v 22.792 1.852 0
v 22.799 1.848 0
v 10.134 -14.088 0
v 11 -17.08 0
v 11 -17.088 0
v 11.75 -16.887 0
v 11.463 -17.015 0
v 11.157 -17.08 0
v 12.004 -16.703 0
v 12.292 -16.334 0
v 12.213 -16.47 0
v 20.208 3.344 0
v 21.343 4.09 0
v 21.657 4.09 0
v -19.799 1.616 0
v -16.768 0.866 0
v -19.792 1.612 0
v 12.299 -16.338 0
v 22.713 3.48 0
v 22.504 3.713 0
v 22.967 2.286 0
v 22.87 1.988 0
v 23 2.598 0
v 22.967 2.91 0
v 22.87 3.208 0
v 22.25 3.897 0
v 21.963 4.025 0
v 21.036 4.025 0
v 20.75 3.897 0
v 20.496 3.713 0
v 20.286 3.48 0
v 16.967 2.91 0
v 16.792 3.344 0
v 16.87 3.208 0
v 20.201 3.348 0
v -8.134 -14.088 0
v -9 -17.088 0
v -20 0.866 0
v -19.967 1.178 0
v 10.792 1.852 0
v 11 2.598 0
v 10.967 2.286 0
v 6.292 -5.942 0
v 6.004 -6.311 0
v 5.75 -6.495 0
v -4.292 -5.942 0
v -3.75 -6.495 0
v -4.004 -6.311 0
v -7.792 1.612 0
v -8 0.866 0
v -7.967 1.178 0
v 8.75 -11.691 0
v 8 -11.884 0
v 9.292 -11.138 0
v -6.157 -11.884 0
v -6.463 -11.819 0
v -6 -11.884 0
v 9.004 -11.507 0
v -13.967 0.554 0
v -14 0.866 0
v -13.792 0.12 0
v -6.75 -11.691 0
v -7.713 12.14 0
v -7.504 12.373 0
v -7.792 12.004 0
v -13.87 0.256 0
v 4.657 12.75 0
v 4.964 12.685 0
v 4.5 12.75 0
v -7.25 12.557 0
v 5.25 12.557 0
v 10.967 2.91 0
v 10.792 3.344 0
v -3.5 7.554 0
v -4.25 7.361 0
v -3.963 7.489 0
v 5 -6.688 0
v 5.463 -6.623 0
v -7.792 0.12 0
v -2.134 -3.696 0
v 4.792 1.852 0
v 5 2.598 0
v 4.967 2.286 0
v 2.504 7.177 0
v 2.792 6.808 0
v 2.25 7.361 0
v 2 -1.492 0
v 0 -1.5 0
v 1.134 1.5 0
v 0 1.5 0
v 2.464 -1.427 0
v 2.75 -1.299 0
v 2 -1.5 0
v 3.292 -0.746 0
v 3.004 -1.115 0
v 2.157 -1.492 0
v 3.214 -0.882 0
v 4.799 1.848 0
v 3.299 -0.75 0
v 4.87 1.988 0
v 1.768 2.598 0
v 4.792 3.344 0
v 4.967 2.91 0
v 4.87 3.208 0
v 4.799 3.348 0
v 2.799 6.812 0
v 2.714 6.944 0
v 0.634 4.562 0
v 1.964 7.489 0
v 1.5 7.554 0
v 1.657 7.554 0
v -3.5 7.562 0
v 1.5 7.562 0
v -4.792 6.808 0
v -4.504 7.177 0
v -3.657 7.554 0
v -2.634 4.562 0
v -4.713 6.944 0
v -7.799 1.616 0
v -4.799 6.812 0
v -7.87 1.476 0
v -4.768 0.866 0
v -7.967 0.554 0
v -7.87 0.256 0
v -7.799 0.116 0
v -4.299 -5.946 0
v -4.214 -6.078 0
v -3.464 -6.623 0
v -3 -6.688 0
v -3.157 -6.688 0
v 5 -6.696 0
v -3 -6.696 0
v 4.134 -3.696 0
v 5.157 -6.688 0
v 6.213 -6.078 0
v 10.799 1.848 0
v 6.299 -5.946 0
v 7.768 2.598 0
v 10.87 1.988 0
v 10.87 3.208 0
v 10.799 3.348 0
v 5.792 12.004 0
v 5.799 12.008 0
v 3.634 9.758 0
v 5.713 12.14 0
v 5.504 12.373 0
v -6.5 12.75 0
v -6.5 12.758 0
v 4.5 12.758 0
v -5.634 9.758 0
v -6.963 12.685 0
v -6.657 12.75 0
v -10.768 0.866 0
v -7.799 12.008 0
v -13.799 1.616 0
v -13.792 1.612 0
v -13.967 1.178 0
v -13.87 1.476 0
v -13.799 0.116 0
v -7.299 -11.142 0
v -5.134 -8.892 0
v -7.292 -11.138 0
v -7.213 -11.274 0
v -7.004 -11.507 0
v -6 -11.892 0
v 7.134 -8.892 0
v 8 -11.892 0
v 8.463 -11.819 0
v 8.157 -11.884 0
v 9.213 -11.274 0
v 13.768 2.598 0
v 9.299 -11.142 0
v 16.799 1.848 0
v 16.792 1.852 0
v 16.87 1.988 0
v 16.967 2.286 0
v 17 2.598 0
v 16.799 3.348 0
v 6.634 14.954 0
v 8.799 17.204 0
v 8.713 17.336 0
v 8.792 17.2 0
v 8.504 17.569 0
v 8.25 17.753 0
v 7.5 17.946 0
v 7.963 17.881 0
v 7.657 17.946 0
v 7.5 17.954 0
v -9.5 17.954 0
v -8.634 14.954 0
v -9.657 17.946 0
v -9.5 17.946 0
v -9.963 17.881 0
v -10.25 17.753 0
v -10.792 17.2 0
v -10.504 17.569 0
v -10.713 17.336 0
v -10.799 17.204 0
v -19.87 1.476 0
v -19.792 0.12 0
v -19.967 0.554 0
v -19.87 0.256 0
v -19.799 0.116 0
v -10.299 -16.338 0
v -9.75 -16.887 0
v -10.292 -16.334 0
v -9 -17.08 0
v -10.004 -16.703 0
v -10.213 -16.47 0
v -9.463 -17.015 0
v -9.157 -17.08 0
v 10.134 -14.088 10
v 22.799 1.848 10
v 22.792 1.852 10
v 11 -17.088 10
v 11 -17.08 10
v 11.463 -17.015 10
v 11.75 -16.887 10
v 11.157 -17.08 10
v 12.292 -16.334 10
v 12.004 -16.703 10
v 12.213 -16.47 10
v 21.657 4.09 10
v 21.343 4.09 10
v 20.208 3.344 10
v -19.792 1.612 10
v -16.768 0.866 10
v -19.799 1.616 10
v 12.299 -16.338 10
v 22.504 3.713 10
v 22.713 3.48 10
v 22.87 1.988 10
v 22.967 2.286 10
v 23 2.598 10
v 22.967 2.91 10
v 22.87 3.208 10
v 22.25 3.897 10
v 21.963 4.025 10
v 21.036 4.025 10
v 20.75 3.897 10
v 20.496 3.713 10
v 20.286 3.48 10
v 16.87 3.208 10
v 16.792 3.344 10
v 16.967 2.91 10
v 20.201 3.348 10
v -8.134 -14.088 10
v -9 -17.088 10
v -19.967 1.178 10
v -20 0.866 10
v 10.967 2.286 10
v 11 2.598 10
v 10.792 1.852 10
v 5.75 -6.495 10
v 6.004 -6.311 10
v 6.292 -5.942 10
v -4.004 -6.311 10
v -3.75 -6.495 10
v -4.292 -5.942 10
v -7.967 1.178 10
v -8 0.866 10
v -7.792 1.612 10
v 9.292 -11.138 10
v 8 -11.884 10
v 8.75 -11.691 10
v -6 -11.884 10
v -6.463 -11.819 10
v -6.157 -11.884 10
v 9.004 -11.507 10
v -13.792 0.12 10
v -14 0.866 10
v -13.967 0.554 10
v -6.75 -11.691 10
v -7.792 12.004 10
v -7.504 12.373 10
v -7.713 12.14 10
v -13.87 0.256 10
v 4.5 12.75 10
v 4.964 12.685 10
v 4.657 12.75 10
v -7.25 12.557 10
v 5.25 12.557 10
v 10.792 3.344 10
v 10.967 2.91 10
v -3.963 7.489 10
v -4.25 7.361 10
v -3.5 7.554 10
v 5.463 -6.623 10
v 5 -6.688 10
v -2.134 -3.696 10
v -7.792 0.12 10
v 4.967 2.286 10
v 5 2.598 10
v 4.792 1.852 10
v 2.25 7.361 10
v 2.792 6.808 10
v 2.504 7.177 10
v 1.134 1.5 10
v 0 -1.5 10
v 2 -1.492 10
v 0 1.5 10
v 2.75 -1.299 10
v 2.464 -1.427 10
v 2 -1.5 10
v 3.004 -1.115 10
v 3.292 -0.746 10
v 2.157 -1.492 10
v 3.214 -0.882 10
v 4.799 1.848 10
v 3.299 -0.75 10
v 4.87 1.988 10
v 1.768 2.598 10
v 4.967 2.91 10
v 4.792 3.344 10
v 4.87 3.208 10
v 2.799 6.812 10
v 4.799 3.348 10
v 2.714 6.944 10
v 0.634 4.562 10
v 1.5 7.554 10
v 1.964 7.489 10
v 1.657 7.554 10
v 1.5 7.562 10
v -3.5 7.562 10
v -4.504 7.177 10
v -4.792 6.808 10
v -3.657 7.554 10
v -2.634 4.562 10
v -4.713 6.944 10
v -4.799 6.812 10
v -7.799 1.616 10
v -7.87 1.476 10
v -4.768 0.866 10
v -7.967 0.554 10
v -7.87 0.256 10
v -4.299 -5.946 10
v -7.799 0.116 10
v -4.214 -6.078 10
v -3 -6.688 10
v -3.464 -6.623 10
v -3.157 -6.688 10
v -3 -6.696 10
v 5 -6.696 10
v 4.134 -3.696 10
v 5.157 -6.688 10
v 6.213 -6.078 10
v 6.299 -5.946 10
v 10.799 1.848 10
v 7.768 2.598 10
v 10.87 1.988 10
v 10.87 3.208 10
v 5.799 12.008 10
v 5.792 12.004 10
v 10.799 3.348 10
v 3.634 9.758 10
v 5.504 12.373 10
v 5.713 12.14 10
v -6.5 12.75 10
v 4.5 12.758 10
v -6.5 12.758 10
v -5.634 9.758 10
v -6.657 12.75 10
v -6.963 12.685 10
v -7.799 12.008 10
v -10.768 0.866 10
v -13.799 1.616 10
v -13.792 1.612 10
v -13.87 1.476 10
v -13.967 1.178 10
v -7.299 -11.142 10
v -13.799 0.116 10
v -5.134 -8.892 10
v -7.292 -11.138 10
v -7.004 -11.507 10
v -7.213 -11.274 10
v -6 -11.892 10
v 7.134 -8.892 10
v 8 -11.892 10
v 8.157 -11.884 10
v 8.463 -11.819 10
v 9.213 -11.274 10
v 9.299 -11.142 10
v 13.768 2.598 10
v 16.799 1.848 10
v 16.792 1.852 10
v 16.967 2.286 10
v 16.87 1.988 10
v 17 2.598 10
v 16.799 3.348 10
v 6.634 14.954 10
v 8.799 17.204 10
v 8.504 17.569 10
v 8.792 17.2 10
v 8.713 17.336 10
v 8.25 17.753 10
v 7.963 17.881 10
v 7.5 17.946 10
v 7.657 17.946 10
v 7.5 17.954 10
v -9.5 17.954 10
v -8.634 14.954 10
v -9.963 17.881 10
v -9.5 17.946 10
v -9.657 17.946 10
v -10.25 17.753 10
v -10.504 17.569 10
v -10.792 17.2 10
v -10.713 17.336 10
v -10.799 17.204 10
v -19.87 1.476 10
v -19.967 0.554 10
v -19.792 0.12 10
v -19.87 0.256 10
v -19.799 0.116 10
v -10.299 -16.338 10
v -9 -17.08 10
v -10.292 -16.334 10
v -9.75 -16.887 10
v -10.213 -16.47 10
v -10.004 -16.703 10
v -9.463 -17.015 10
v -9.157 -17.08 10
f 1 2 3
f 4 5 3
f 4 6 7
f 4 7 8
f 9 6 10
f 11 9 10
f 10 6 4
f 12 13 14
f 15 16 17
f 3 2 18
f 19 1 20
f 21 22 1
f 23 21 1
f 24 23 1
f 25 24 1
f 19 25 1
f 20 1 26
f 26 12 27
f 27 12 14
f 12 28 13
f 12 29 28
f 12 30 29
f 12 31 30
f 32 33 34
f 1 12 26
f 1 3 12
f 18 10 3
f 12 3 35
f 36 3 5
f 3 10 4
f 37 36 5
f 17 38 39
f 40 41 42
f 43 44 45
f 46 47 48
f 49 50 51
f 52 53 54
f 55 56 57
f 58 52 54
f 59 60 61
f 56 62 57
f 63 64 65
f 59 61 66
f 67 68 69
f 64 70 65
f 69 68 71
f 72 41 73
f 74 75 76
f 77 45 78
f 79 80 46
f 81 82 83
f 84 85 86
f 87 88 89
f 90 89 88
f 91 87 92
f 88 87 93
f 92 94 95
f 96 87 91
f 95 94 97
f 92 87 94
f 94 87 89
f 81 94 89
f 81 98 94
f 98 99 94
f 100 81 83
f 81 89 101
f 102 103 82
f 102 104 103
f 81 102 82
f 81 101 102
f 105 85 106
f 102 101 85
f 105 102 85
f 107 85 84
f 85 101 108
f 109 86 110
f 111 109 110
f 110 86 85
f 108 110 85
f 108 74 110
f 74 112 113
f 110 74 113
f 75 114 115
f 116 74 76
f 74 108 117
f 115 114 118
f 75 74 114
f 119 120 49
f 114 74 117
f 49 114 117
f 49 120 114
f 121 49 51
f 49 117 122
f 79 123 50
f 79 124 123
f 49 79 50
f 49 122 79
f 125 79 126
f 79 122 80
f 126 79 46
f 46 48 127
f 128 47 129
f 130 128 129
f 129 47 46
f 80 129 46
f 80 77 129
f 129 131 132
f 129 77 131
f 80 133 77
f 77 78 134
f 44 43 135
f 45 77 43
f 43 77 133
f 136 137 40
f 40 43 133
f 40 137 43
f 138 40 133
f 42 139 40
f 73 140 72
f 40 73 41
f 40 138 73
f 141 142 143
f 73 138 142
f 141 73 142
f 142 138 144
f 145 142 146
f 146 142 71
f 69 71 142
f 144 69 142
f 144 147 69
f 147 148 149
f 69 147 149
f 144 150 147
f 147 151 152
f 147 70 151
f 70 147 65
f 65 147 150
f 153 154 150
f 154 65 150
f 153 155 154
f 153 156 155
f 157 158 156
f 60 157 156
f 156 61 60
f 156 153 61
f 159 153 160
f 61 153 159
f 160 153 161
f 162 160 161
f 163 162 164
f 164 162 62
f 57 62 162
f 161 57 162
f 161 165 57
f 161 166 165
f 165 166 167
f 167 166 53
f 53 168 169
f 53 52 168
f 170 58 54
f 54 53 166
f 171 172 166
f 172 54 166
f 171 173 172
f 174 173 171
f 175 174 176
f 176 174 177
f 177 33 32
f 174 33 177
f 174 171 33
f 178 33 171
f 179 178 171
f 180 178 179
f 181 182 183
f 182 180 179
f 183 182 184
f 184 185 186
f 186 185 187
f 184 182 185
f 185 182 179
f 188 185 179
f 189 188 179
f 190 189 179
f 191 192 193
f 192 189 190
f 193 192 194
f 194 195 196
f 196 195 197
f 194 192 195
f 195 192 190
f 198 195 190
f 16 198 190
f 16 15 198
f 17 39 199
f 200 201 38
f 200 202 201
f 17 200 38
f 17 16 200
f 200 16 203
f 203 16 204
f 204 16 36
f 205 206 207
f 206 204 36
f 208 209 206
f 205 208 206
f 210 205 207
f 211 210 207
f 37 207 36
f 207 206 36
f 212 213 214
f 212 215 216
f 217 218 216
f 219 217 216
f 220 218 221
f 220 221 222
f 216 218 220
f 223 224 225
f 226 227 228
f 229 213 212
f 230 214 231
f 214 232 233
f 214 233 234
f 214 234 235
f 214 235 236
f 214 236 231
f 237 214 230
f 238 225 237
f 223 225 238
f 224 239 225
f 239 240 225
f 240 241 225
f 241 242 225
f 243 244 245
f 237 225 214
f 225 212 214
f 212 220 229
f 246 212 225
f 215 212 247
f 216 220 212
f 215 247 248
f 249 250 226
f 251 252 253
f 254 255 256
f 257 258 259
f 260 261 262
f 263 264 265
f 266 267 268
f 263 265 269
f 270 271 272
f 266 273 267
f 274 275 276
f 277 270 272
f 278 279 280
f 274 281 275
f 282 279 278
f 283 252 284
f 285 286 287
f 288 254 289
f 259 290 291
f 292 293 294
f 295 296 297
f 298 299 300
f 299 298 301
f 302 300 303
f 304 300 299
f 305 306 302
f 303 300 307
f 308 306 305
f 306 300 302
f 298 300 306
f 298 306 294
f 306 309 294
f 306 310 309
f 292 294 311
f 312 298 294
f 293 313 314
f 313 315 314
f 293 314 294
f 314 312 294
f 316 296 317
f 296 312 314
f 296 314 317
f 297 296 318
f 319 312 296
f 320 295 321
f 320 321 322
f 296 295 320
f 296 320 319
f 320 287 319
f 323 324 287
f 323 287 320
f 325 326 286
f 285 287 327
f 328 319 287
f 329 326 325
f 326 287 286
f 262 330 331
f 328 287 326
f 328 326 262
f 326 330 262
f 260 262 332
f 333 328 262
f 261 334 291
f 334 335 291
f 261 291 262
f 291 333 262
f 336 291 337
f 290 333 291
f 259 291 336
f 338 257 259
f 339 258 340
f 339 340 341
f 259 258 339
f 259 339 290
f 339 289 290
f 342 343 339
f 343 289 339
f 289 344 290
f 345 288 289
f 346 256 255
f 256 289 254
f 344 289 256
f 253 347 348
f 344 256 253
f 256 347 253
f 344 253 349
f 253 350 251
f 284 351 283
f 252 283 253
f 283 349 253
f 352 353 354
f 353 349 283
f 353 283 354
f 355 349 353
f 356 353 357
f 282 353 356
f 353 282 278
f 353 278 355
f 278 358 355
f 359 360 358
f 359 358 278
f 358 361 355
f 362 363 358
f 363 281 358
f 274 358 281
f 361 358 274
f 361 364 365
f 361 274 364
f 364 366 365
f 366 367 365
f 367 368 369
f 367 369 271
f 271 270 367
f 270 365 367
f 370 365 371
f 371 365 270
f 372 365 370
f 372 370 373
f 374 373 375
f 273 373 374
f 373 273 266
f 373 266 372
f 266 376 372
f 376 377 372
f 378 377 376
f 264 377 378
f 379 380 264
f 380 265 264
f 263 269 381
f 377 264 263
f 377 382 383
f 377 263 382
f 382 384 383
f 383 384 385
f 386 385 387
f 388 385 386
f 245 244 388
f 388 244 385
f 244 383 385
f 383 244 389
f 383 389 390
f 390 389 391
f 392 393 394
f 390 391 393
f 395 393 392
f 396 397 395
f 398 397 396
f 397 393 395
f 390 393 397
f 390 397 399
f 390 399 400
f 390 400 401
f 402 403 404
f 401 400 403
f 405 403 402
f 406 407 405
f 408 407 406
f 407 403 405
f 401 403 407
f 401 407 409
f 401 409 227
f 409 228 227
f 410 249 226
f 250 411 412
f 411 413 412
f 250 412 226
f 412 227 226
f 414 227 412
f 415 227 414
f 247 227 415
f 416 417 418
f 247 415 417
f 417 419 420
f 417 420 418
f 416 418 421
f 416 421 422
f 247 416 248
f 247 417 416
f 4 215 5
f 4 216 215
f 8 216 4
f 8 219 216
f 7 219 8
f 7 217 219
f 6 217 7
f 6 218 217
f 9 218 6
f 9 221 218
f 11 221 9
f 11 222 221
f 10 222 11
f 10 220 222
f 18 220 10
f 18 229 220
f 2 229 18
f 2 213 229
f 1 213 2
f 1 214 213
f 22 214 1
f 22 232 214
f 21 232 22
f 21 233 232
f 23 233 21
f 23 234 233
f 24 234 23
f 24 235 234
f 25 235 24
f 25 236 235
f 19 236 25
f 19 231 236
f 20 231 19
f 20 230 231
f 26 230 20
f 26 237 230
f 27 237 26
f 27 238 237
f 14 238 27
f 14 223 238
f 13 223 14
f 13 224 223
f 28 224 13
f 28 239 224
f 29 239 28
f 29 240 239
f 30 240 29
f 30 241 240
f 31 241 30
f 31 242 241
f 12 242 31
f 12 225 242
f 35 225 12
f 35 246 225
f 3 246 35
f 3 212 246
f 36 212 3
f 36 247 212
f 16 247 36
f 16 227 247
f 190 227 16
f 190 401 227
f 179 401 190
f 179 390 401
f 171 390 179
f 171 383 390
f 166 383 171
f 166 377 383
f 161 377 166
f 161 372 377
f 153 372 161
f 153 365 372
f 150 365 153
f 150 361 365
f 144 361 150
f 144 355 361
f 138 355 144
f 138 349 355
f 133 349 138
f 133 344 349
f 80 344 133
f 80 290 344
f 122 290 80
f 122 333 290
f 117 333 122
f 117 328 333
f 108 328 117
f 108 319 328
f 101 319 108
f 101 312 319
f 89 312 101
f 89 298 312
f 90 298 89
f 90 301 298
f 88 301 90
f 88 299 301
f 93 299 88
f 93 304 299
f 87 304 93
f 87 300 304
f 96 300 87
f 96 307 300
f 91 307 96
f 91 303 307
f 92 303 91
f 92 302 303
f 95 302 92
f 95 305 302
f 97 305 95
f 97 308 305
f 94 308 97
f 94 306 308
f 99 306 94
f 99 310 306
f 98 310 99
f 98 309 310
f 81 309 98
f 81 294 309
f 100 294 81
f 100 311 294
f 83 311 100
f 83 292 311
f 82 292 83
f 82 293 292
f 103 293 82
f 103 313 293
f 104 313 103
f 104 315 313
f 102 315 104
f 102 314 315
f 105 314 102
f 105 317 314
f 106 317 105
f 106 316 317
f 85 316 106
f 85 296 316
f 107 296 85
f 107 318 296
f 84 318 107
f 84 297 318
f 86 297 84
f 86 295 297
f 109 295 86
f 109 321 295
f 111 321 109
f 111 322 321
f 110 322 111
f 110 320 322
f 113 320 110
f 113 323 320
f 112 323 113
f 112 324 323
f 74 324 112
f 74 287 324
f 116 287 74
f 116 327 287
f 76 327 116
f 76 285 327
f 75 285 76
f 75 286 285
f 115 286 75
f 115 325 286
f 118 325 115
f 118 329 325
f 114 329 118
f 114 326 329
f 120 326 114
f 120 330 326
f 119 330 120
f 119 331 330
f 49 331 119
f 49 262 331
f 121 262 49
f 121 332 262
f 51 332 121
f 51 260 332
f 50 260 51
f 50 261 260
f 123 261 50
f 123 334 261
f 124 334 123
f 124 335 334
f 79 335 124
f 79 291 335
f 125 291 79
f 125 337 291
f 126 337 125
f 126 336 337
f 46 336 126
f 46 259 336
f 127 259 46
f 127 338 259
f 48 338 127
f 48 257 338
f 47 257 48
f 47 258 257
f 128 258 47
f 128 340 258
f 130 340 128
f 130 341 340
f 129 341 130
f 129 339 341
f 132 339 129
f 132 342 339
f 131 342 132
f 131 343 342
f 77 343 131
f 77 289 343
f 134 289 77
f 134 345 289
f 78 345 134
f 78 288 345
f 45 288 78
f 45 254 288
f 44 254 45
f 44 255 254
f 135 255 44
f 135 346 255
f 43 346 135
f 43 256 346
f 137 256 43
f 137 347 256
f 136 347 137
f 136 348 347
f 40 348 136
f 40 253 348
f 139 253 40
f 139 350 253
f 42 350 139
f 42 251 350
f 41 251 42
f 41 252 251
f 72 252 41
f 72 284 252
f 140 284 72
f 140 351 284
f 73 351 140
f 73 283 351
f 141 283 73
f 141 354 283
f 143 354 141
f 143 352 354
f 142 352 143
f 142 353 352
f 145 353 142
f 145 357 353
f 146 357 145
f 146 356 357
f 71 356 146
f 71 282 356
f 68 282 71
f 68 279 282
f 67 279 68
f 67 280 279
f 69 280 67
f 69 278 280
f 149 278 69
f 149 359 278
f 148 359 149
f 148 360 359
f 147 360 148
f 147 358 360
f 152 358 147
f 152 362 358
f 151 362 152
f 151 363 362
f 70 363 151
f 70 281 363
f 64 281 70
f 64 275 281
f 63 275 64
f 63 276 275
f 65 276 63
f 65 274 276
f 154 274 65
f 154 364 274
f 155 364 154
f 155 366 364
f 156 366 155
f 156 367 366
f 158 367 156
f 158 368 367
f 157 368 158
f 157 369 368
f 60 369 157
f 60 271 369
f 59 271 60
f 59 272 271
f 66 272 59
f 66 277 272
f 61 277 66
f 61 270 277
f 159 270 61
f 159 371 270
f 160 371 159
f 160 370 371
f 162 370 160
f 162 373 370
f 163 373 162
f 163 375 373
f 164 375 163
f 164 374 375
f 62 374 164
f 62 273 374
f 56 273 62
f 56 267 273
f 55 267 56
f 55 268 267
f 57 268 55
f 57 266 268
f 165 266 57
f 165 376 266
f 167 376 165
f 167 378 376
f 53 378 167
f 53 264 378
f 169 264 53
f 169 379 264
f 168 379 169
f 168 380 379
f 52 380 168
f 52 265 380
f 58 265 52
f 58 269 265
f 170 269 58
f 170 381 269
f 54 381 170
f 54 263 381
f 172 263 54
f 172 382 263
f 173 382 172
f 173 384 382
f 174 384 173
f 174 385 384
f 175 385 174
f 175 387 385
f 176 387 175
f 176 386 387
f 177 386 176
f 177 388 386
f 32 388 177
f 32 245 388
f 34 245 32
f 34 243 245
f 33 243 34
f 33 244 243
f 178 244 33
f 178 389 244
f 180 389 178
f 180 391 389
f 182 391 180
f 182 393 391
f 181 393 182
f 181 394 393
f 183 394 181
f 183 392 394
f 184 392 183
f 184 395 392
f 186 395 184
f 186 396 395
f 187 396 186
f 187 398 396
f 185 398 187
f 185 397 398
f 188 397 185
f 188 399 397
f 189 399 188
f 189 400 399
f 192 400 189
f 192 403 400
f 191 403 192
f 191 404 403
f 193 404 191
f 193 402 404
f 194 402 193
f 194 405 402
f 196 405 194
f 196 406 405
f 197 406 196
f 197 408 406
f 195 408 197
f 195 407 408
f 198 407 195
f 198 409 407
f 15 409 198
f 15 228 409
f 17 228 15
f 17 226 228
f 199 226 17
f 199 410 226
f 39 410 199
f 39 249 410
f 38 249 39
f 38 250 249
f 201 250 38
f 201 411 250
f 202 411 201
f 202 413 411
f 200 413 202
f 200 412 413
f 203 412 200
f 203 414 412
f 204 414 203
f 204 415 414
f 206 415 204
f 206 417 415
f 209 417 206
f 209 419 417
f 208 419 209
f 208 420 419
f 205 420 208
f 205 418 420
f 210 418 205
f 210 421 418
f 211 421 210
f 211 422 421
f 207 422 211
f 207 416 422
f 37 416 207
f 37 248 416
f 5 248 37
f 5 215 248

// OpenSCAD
/*
   turtle simulation 
   
   Kit Wallace 
   
   Code licensed under the Creative Commons - Attribution - Share Alike license.

  The project is documented in my blog 
   http://kitwallace.tumblr.com/tagged/turtle

*/

function flatten(l) = [ for (a = l) for (b = a) b ] ;

module ruler(n) {
   for (i=[0:n-1]) 
       translate([(i-n/2 +0.5)* 10,0,0]) cube([9.8,5,2], center=true);
}

module turtle (steps, i=0) {
  if ( i < len(steps)) {
   step = steps[i];
   command=step[0];
      
   if(command=="F") {
       distance = step[1];
       width=step[2];
       translate([distance/2,0]) 
            square([distance,width],center=true);
       translate([distance,0]) 
         turtle(steps,i+1);
      }
   else if (command=="L") {
      angle=step[1];
      width=step[2];
      circle(width/2);
      rotate([0,0,angle])
         turtle(steps,i+1);
      }
   else if (command=="R") {
      angle=step[1];
      width=step[2];
      circle(width/2);
      rotate([0,0,-angle])
         turtle(steps,i+1);
      }
   else
      echo("unknown command" ,step);
  }
};

//  basic poly 
function poly(side,angle,steps,width=1) =
   flatten(
    [for (i=[0:steps-1])
     [ ["F",side,width],["R",angle,width]]
    ]);

function poly2(side,angle,steps,width=1) =
   flatten(
    [for (i=[0:steps-1])
     [ ["F",side,width],["R",angle,width],["F",side,width],["R",2*angle,width] ]
    ]);

function spi(side,side_inc,angle,width=1,steps) =
   steps == 0
      ? []
      : concat( [["F",side,width]],
                [["L",angle,width]] ,
                spi(side+side_inc,side_inc,angle,width,steps-1) 
              )
    ; 
    
$fn=30;
// steps = poly(20,90,4);      //square
// steps = poly(10,45,8,4);    // an octagon  
// steps =  poly(40,144,5,2);  // a pentagram
// steps = poly(30,135,8);
// steps = poly(20,108,11);
// steps= poly2(5,144,5);
// steps= poly2(3,125,40,0.5);
    
steps = spi(2,1,60,3,20);
echo(steps);
    
linear_extrude(height=10)
    turtle(steps);

*ruler(10);
